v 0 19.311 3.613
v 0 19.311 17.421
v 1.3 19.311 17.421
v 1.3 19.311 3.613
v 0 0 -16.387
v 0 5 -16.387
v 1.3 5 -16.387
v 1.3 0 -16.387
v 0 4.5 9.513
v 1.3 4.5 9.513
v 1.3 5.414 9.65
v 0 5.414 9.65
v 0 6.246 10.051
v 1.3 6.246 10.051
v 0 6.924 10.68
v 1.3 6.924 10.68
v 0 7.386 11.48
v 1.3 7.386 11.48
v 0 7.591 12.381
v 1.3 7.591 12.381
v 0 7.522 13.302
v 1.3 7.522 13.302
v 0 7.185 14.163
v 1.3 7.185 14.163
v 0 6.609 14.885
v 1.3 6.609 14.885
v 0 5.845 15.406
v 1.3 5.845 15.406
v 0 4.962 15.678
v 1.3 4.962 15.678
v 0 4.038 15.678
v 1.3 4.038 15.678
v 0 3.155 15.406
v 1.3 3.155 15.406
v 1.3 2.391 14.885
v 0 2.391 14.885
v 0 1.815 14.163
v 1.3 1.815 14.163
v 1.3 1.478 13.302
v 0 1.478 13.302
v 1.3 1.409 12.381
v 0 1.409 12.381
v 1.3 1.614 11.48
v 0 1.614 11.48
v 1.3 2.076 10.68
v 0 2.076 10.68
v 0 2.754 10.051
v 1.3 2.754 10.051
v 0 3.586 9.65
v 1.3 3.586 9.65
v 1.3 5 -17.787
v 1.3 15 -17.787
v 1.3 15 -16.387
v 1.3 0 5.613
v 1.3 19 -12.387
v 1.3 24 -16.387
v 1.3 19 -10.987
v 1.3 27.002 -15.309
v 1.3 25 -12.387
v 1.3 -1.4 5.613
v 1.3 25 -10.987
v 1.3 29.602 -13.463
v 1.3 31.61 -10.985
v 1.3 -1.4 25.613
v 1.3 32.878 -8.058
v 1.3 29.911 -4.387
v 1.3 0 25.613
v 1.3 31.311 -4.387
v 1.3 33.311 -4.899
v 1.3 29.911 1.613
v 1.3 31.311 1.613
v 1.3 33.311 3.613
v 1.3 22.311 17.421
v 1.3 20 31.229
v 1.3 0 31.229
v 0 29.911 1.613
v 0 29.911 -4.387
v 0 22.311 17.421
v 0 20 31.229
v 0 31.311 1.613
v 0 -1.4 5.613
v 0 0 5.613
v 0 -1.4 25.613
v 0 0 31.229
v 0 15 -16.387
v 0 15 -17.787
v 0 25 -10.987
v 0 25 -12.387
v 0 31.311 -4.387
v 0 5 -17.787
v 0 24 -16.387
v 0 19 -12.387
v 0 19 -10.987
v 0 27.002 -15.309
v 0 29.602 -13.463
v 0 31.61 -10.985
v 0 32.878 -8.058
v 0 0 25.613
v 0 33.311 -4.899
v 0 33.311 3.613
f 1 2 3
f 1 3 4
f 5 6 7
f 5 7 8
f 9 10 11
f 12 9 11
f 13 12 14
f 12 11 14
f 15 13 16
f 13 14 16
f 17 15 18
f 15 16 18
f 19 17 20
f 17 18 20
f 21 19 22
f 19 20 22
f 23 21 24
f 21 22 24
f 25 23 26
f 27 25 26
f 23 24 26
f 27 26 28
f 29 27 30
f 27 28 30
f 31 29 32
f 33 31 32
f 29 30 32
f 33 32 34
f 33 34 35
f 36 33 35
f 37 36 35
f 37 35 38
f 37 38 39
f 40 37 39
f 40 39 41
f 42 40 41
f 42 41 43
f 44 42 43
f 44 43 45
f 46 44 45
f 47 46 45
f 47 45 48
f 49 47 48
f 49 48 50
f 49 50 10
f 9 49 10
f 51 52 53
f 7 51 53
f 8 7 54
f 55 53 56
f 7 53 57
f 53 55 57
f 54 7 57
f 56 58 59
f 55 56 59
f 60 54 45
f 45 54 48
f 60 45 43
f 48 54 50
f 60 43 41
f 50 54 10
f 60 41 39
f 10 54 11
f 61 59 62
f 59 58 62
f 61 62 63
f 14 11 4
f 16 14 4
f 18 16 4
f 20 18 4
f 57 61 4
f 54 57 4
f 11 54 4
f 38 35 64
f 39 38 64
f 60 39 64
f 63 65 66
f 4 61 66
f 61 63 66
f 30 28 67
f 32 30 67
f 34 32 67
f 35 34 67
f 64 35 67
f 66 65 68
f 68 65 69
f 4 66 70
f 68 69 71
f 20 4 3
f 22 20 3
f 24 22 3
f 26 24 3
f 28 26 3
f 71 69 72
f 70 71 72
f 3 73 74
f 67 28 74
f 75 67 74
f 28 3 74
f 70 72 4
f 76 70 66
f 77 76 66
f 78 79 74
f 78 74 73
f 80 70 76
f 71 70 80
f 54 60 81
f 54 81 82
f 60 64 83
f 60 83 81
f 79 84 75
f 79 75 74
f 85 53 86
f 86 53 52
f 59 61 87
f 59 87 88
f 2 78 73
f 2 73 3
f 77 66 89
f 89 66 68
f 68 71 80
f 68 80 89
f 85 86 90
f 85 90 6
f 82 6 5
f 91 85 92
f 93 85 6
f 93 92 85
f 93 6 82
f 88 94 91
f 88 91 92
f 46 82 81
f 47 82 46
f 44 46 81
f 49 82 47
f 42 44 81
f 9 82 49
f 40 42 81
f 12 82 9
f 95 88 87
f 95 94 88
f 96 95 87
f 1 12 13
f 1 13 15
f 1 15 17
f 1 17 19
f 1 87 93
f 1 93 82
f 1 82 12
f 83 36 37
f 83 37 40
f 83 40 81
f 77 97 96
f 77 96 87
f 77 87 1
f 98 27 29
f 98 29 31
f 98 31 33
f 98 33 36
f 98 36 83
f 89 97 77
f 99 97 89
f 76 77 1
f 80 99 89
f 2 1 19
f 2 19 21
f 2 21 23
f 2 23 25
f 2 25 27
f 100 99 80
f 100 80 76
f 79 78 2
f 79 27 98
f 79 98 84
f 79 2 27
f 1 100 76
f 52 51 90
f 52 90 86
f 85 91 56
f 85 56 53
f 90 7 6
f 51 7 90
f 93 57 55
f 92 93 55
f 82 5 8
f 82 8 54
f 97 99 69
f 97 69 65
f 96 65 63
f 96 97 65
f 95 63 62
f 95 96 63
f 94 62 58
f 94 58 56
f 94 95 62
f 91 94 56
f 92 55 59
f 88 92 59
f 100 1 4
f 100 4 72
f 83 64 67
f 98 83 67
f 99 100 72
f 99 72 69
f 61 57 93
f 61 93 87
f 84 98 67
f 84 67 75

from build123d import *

# Parameters (mm, degrees)
BOSS_EXTRUDE1_DEPTH = 1.3
SKETCH2_W           = 20
SKETCH2_H           = 1.4
SKETCH2_W_2         = 1.4
SKETCH2_H_2         = 10
BOSS_EXTRUDE2_DEPTH = 1.3
SKETCH3_W           = 6
SKETCH3_H           = 1.4
SKETCH3_W_2         = 1.4
SKETCH3_H_2         = 6
CUT_EXTRUDE1_DEPTH  = 46.678384543
SKETCH4_R           = 3.1
CUT_EXTRUDE2_DEPTH  = 46.678384543


with BuildPart() as part:
    # Sketch1 → Boss-Extrude1 (new body)
    with BuildSketch(Plane(origin=(0, 0, 0), x_dir=(0, 0, -1), z_dir=(1, 0, 0))):
        with BuildLine():
            Line((-31.228581667, 0), (-31.228581667, 20))
            Line((-31.228581667, 20), (-17.420583246, 22.310666482))
            Line((-17.420583246, 22.310666482), (-17.420583246, 19.310666482))
            Line((-17.420583246, 19.310666482), (-3.612584824, 19.310666482))
            Line((-3.612584824, 19.310666482), (-3.612584824, 33.310666482))
            Line((-3.612584824, 33.310666482), (4.898619689, 33.310666482))
            ThreePointArc((4.898619689, 33.310666482), (12.292551865, 30.690758286), (16.387415176, 24))
            Line((16.387415176, 24), (16.387415176, 0))
            Line((16.387415176, 0), (0, 0))
            Line((0, 0), (-31.228581667, 0))
        make_face()
    extrude(amount=BOSS_EXTRUDE1_DEPTH)

    # Sketch2 → Boss-Extrude2 (add)
    with BuildSketch(Plane(origin=(1.3, 0, 0), x_dir=(0, 0, -1), z_dir=(1, 0, 0))):
        with Locations((-15.612584824, -0.7)):
            Rectangle(SKETCH2_W, SKETCH2_H)
        with Locations((17.087415176, 10)):
            Rectangle(SKETCH2_W_2, SKETCH2_H_2)
    extrude(amount=-BOSS_EXTRUDE2_DEPTH)

    # Sketch3 → Cut-Extrude1 (cut, through all)
    with BuildSketch(Plane(origin=(1.3, 0, 0), x_dir=(0, 0, -1), z_dir=(1, 0, 0))):
        with Locations((1.387415176, 30.610666482)):
            Rectangle(SKETCH3_W, SKETCH3_H)
        with Locations((11.687415176, 22)):
            Rectangle(SKETCH3_W_2, SKETCH3_H_2)
    extrude(amount=-CUT_EXTRUDE1_DEPTH, mode=Mode.SUBTRACT)

    # Sketch4 → Cut-Extrude2 (cut, through all)
    with BuildSketch(Plane(origin=(1.3, 0, 0), x_dir=(0, 0, -1), z_dir=(1, 0, 0))):
        with Locations((-12.612584824, 4.5)):
            Circle(SKETCH4_R)
    extrude(amount=-CUT_EXTRUDE2_DEPTH, mode=Mode.SUBTRACT)


solid = part.part
